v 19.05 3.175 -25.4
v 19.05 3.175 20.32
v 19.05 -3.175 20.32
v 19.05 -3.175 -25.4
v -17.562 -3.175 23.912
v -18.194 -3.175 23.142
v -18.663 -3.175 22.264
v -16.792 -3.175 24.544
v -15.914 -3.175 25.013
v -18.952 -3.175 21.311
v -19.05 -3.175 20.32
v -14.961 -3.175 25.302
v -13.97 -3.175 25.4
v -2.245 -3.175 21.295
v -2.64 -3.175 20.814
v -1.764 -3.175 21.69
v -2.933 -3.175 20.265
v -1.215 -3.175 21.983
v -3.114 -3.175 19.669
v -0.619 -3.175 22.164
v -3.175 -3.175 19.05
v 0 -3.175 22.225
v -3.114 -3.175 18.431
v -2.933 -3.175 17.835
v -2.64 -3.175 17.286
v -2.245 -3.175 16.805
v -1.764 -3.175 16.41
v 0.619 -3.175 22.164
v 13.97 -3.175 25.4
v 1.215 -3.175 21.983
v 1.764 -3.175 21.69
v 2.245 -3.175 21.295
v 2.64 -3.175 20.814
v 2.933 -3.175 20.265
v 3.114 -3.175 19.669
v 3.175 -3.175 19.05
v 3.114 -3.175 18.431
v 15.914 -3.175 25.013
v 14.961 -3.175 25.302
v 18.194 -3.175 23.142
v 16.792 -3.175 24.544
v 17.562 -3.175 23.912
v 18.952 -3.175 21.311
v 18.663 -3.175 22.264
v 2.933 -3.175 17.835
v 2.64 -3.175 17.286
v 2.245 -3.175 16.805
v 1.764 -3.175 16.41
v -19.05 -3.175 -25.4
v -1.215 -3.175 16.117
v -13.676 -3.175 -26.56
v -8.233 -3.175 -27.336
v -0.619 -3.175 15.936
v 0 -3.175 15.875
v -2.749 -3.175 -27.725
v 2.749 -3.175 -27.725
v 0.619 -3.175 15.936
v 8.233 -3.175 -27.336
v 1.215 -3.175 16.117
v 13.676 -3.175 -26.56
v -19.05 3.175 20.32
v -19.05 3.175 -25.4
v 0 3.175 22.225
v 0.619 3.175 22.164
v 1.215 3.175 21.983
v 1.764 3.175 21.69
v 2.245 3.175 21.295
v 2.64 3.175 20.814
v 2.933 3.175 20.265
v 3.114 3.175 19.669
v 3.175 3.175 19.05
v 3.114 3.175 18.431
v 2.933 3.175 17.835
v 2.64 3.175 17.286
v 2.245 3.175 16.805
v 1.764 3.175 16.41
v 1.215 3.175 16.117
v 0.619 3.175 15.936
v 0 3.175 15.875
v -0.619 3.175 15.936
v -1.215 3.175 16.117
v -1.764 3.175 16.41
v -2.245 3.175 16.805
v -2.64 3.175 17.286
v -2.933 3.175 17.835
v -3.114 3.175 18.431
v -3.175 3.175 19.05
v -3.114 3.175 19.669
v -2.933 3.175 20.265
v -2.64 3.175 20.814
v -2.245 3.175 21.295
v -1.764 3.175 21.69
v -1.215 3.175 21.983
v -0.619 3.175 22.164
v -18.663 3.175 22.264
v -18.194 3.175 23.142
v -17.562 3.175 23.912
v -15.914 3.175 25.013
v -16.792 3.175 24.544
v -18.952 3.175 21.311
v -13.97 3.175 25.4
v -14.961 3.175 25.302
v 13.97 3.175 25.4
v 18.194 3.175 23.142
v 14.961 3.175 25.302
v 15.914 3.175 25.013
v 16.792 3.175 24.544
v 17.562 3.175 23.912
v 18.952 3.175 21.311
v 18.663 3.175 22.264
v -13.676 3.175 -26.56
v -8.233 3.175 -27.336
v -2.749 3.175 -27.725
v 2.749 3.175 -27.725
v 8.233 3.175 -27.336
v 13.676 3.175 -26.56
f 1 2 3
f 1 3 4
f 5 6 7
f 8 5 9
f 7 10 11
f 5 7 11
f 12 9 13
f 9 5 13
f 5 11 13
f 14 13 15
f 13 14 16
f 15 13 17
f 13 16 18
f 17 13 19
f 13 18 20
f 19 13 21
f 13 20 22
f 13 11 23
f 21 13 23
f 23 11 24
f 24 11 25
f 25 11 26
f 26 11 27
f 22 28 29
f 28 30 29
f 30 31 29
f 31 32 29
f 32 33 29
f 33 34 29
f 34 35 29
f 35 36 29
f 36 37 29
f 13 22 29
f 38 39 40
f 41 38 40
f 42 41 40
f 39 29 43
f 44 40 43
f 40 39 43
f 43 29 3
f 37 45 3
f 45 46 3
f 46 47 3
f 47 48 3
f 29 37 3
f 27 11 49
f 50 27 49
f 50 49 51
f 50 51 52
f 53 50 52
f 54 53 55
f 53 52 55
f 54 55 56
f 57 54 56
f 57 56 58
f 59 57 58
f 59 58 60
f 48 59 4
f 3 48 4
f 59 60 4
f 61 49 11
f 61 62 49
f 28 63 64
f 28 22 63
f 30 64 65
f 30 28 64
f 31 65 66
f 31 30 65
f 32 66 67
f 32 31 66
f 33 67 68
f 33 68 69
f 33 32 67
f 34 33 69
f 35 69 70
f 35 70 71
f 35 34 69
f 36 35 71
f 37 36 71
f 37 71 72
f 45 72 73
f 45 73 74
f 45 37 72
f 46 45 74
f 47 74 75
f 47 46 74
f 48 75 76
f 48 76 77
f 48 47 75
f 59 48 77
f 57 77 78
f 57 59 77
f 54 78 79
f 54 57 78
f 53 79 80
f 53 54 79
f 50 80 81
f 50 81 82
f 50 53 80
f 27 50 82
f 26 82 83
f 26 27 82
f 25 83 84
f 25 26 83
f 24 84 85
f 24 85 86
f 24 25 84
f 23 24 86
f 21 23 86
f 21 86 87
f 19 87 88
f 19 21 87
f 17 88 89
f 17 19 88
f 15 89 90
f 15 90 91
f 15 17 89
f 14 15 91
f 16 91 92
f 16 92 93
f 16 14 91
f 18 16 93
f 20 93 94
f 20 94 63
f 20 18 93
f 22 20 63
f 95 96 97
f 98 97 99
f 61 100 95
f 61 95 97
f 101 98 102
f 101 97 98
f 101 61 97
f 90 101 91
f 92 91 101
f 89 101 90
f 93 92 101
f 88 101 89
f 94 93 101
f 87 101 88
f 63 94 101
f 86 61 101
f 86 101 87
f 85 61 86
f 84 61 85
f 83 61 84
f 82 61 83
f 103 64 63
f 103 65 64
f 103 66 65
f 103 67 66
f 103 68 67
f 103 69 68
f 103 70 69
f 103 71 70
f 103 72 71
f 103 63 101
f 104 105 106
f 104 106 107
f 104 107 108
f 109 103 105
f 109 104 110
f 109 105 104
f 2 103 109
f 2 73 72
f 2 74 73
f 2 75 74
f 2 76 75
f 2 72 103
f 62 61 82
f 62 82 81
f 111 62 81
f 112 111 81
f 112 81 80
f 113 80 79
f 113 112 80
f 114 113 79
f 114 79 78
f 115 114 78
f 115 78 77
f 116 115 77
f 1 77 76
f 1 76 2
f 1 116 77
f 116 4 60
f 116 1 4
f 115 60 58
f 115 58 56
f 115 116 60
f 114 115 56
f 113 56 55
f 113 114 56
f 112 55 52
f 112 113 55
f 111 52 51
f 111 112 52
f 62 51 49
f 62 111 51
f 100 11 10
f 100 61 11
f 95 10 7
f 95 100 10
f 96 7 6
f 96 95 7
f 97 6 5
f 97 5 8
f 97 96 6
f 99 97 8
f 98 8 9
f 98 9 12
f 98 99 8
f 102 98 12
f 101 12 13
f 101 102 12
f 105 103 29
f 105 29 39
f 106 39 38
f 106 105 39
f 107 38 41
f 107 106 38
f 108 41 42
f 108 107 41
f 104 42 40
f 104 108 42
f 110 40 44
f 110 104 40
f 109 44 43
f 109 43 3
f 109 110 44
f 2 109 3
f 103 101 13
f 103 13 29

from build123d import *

# Parameters (mm, degrees)
SKETCH2_R           = 3.175
BOSS_EXTRUDE1_DEPTH = 3.175


with BuildPart() as part:
    # Sketch2 → Boss-Extrude1 (new, symmetric)
    with BuildSketch(Plane(origin=(0, 0, 0), x_dir=(1, 0, 0), z_dir=(0, 1, 0))):
        with BuildLine():
            ThreePointArc((-19.05, -20.32), (-17.562102448, -23.912102448), (-13.97, -25.4))
            Line((-13.97, -25.4), (13.97, -25.4))
            ThreePointArc((13.97, -25.4), (17.562102448, -23.912102448), (19.05, -20.32))
            Line((19.05, -20.32), (19.05, 25.4))
            ThreePointArc((19.05, 25.4), (0, 27.773915087), (-19.05, 25.4))
            Line((-19.05, 25.4), (-19.05, -20.32))
        make_face()
        with Locations(Location((0, -19.05, 0), (0, 0, 270))):
            Circle(SKETCH2_R, mode=Mode.SUBTRACT)
    extrude(amount=BOSS_EXTRUDE1_DEPTH, both=True)


solid = part.part
